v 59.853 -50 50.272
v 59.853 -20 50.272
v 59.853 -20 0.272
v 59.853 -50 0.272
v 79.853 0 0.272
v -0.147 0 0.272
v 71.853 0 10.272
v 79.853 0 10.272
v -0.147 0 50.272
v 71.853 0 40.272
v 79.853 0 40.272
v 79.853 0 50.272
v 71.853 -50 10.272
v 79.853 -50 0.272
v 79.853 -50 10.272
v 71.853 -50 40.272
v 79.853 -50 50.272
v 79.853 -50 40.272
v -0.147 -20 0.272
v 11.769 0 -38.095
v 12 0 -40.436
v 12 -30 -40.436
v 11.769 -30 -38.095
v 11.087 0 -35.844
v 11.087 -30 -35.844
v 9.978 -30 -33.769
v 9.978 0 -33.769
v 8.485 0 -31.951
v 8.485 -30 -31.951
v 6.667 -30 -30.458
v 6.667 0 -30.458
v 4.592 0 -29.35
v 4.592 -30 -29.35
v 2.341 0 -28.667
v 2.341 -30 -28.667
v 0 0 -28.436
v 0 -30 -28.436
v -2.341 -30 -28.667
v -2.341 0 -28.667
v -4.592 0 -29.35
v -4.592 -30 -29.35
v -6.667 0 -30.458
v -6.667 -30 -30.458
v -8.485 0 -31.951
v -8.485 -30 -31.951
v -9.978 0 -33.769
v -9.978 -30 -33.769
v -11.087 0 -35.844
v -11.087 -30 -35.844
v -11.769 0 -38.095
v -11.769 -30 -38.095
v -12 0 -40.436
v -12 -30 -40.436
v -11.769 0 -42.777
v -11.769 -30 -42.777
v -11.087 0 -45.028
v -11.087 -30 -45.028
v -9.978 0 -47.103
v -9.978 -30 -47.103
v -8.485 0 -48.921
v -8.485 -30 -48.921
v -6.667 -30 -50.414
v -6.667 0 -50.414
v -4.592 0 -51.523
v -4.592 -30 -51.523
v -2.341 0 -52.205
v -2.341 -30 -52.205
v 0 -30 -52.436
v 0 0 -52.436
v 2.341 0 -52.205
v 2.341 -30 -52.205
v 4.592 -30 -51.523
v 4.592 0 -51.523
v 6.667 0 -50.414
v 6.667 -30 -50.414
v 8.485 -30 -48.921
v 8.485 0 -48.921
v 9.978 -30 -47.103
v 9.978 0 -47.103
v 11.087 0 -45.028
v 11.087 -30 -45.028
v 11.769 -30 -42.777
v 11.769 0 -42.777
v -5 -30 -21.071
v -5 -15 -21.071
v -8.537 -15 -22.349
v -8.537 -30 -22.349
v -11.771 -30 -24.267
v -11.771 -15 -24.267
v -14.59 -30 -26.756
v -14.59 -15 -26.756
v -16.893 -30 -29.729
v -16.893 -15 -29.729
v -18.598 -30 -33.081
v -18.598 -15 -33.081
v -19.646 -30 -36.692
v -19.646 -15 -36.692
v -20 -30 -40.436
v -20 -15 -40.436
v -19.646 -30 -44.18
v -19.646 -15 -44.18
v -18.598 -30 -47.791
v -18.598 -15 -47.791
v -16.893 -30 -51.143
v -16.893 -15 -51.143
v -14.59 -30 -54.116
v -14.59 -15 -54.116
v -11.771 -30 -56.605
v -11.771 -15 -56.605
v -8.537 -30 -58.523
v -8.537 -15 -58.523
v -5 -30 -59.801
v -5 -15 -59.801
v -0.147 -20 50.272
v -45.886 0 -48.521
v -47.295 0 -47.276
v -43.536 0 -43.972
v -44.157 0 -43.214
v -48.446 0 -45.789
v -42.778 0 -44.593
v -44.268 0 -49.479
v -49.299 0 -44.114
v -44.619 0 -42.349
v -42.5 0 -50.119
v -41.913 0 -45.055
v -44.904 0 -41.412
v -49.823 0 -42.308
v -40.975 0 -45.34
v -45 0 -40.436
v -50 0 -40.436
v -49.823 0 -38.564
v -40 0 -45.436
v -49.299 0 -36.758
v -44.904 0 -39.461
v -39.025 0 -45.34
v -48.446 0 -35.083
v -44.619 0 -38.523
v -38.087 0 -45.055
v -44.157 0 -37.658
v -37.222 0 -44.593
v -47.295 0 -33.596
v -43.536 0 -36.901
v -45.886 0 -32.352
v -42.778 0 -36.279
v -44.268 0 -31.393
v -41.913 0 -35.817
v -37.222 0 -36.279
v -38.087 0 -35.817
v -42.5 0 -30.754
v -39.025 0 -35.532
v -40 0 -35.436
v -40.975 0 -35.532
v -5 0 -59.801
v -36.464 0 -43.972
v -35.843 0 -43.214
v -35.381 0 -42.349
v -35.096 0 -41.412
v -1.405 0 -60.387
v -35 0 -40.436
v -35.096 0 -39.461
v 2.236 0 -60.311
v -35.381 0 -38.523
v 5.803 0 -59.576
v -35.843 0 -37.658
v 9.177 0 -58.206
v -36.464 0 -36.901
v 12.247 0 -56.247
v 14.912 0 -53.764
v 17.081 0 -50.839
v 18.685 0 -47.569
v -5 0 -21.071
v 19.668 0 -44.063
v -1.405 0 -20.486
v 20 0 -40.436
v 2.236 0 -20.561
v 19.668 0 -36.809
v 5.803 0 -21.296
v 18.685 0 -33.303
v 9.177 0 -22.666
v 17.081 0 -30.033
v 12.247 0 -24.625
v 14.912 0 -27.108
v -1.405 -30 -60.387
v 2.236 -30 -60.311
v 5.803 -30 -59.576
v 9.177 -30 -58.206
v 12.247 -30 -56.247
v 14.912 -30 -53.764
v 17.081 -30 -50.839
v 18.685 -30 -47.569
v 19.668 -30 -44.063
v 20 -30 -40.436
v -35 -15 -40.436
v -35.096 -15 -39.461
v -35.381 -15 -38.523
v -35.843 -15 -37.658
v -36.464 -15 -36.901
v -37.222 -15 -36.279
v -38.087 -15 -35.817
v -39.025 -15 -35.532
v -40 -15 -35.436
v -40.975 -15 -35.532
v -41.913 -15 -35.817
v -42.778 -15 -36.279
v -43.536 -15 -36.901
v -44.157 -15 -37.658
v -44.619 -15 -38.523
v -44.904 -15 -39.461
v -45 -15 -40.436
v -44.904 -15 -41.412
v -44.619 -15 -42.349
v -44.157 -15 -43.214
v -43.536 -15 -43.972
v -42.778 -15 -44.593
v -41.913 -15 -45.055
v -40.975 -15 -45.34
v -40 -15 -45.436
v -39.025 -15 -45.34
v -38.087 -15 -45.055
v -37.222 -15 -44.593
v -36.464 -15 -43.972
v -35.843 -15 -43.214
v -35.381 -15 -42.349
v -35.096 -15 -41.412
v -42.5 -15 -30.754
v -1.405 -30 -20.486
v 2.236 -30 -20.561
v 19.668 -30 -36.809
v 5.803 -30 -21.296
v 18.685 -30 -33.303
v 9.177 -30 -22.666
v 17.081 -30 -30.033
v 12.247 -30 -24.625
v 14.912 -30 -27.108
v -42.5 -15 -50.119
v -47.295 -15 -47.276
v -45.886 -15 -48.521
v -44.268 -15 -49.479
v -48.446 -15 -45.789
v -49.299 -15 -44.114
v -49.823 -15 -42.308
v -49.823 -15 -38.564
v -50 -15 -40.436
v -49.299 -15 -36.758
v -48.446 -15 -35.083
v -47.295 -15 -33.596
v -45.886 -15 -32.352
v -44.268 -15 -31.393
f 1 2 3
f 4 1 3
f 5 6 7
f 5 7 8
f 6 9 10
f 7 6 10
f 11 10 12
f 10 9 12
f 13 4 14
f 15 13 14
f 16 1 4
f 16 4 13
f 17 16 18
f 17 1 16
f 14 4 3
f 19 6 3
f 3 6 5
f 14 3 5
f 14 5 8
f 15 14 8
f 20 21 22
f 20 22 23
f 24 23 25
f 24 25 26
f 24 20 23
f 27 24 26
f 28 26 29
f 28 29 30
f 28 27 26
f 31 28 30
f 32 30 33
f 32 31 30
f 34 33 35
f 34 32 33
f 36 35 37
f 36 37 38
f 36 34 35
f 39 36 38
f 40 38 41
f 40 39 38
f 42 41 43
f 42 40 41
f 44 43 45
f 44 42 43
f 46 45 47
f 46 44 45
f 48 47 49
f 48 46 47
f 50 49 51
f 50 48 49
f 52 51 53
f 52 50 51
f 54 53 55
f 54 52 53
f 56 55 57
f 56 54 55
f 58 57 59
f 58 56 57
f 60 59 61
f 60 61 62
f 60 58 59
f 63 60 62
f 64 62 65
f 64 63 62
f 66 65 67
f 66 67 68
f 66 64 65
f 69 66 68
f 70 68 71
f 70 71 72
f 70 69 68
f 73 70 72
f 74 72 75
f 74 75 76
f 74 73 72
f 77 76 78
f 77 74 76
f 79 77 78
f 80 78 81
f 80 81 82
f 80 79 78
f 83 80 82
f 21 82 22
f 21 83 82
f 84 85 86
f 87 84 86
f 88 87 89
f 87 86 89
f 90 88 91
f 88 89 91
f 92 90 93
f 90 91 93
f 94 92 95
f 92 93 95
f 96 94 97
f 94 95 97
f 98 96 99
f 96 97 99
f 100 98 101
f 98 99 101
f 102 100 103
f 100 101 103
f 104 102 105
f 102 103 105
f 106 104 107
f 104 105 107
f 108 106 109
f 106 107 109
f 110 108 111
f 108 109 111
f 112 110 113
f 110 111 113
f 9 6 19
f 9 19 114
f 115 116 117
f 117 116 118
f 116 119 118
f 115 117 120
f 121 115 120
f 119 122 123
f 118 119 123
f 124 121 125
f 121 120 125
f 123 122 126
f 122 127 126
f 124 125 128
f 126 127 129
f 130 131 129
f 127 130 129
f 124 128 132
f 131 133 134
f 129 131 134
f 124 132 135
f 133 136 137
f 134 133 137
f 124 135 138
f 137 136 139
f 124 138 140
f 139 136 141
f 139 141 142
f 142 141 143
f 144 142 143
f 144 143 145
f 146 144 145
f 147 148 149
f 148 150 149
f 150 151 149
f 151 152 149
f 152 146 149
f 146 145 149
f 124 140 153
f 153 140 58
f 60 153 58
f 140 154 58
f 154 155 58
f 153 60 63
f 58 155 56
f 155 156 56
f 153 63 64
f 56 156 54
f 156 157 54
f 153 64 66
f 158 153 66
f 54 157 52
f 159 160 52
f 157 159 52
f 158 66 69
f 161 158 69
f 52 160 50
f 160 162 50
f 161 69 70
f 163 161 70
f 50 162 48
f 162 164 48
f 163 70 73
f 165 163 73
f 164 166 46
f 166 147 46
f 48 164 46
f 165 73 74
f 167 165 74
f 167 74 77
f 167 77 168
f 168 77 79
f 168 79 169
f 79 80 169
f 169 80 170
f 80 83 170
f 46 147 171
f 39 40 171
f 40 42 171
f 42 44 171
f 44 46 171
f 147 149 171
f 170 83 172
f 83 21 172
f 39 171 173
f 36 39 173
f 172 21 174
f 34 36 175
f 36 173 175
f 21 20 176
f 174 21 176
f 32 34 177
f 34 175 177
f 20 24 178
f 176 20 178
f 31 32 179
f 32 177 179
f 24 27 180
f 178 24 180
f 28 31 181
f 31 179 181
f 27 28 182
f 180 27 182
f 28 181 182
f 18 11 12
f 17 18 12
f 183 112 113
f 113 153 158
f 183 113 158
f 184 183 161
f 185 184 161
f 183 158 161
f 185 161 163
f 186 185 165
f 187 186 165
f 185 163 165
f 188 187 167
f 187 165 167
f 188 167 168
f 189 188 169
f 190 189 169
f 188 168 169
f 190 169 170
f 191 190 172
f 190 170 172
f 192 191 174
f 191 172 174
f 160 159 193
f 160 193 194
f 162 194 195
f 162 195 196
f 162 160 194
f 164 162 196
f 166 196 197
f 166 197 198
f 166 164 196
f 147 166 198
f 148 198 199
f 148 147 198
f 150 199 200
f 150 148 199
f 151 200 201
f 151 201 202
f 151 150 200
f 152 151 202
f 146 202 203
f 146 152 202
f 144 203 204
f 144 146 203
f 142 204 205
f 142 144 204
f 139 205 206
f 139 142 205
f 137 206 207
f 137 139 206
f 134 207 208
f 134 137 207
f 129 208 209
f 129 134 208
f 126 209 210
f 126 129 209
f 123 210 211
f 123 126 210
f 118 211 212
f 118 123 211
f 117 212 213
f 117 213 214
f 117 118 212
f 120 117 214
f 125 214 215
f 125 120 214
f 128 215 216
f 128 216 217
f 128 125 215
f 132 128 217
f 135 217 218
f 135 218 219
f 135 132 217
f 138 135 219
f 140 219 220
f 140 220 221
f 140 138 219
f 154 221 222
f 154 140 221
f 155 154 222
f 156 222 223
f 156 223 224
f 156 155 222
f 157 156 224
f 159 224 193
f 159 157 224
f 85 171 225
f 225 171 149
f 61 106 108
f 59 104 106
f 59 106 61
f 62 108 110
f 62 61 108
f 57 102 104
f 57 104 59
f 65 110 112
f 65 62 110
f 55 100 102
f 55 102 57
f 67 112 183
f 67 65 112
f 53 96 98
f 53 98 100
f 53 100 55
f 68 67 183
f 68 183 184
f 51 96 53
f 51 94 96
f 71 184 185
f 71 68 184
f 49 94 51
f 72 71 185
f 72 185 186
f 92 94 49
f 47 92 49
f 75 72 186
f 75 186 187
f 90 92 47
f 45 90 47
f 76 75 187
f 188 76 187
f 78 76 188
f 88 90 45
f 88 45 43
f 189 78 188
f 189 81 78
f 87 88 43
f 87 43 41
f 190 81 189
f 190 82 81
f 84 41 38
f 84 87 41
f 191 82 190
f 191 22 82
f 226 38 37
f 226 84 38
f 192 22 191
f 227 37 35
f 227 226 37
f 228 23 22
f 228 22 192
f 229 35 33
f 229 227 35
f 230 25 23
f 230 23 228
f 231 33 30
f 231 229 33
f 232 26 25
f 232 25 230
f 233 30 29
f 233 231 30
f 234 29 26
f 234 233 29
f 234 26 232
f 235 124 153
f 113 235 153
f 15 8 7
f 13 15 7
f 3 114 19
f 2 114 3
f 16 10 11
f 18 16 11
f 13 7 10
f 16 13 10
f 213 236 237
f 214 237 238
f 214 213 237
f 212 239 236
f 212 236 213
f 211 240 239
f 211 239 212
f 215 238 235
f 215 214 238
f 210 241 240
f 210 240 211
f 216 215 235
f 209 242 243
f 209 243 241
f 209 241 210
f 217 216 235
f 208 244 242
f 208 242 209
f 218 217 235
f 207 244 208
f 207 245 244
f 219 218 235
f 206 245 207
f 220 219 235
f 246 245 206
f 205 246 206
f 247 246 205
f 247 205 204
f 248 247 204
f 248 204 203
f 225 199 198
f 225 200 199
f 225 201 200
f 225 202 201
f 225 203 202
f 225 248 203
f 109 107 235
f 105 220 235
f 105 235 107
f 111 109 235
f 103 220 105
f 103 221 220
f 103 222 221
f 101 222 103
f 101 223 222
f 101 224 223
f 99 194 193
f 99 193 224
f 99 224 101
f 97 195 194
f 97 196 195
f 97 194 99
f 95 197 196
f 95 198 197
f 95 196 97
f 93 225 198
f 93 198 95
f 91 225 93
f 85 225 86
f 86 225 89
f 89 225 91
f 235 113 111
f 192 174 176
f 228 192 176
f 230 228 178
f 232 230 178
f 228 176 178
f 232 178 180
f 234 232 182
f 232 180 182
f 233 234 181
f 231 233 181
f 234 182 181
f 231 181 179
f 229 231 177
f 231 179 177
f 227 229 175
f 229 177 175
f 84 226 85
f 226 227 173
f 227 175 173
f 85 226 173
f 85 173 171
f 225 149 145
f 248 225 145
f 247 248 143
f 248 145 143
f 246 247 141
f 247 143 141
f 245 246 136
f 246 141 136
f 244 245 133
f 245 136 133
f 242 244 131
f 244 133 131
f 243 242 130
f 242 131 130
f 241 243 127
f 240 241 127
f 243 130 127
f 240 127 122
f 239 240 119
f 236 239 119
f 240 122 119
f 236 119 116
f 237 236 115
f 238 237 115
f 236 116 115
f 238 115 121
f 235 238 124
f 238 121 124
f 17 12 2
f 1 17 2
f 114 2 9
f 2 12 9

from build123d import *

# Parameters (mm, degrees)
F0_W     = 60
F0_H     = 50
F1_DEPTH = 20
F2_DEPTH = 50
F0_R     = 5
F3_DEPTH = 15
F0_R_2   = 12
F4_DEPTH = 30


with BuildPart() as f1:
    # F0 (on Front) → F1 (new body)
    with BuildSketch(Plane.XZ):
        with Locations((29.852928, 25.271601)):
            Rectangle(F0_W, F0_H)
    extrude(amount=F1_DEPTH)

    # F0 (on Front) → F2 (join)
    with BuildSketch(Plane.XZ):
        Polygon((79.852928, 50.271601), (59.852928, 50.271601), (59.852928, 0.271601), (79.852928, 0.271601), (79.852928, 10.271601), (71.852928, 10.271601), (71.852928, 40.271601), (79.852928, 40.271601), align=None)
    extrude(amount=F2_DEPTH)


with BuildPart() as f3:
    # F0 (on Front) → F3 (new body)
    with BuildSketch(Plane.XZ):
        with BuildLine():
            Line((-5, -21.071143), (-42.5, -30.753601))
            ThreePointArc((-42.5, -30.753601), (-50, -40.436059), (-42.5, -50.118518))
            Line((-42.5, -50.118518), (-5, -59.800976))
            ThreePointArc((-5, -59.800976), (-20, -40.436059), (-5, -21.071143))
        make_face()
        with Locations((-40, -40.436059)):
            Circle(F0_R, mode=Mode.SUBTRACT)
    extrude(amount=F3_DEPTH)

    # F0 (on Front) → F4 (join)
    with BuildSketch(Plane.XZ):
        with BuildLine():
            ThreePointArc((20, -40.436059), (12.247449, -24.624671), (-5, -21.071143))
            ThreePointArc((-5, -21.071143), (-20, -40.436059), (-5, -59.800976))
            ThreePointArc((-5, -59.800976), (12.247449, -56.247448), (20, -40.436059))
        make_face()
        with Locations((0, -40.436059)):
            Circle(F0_R_2, mode=Mode.SUBTRACT)
    extrude(amount=F4_DEPTH)


solid = Compound([f1.part, f3.part])
